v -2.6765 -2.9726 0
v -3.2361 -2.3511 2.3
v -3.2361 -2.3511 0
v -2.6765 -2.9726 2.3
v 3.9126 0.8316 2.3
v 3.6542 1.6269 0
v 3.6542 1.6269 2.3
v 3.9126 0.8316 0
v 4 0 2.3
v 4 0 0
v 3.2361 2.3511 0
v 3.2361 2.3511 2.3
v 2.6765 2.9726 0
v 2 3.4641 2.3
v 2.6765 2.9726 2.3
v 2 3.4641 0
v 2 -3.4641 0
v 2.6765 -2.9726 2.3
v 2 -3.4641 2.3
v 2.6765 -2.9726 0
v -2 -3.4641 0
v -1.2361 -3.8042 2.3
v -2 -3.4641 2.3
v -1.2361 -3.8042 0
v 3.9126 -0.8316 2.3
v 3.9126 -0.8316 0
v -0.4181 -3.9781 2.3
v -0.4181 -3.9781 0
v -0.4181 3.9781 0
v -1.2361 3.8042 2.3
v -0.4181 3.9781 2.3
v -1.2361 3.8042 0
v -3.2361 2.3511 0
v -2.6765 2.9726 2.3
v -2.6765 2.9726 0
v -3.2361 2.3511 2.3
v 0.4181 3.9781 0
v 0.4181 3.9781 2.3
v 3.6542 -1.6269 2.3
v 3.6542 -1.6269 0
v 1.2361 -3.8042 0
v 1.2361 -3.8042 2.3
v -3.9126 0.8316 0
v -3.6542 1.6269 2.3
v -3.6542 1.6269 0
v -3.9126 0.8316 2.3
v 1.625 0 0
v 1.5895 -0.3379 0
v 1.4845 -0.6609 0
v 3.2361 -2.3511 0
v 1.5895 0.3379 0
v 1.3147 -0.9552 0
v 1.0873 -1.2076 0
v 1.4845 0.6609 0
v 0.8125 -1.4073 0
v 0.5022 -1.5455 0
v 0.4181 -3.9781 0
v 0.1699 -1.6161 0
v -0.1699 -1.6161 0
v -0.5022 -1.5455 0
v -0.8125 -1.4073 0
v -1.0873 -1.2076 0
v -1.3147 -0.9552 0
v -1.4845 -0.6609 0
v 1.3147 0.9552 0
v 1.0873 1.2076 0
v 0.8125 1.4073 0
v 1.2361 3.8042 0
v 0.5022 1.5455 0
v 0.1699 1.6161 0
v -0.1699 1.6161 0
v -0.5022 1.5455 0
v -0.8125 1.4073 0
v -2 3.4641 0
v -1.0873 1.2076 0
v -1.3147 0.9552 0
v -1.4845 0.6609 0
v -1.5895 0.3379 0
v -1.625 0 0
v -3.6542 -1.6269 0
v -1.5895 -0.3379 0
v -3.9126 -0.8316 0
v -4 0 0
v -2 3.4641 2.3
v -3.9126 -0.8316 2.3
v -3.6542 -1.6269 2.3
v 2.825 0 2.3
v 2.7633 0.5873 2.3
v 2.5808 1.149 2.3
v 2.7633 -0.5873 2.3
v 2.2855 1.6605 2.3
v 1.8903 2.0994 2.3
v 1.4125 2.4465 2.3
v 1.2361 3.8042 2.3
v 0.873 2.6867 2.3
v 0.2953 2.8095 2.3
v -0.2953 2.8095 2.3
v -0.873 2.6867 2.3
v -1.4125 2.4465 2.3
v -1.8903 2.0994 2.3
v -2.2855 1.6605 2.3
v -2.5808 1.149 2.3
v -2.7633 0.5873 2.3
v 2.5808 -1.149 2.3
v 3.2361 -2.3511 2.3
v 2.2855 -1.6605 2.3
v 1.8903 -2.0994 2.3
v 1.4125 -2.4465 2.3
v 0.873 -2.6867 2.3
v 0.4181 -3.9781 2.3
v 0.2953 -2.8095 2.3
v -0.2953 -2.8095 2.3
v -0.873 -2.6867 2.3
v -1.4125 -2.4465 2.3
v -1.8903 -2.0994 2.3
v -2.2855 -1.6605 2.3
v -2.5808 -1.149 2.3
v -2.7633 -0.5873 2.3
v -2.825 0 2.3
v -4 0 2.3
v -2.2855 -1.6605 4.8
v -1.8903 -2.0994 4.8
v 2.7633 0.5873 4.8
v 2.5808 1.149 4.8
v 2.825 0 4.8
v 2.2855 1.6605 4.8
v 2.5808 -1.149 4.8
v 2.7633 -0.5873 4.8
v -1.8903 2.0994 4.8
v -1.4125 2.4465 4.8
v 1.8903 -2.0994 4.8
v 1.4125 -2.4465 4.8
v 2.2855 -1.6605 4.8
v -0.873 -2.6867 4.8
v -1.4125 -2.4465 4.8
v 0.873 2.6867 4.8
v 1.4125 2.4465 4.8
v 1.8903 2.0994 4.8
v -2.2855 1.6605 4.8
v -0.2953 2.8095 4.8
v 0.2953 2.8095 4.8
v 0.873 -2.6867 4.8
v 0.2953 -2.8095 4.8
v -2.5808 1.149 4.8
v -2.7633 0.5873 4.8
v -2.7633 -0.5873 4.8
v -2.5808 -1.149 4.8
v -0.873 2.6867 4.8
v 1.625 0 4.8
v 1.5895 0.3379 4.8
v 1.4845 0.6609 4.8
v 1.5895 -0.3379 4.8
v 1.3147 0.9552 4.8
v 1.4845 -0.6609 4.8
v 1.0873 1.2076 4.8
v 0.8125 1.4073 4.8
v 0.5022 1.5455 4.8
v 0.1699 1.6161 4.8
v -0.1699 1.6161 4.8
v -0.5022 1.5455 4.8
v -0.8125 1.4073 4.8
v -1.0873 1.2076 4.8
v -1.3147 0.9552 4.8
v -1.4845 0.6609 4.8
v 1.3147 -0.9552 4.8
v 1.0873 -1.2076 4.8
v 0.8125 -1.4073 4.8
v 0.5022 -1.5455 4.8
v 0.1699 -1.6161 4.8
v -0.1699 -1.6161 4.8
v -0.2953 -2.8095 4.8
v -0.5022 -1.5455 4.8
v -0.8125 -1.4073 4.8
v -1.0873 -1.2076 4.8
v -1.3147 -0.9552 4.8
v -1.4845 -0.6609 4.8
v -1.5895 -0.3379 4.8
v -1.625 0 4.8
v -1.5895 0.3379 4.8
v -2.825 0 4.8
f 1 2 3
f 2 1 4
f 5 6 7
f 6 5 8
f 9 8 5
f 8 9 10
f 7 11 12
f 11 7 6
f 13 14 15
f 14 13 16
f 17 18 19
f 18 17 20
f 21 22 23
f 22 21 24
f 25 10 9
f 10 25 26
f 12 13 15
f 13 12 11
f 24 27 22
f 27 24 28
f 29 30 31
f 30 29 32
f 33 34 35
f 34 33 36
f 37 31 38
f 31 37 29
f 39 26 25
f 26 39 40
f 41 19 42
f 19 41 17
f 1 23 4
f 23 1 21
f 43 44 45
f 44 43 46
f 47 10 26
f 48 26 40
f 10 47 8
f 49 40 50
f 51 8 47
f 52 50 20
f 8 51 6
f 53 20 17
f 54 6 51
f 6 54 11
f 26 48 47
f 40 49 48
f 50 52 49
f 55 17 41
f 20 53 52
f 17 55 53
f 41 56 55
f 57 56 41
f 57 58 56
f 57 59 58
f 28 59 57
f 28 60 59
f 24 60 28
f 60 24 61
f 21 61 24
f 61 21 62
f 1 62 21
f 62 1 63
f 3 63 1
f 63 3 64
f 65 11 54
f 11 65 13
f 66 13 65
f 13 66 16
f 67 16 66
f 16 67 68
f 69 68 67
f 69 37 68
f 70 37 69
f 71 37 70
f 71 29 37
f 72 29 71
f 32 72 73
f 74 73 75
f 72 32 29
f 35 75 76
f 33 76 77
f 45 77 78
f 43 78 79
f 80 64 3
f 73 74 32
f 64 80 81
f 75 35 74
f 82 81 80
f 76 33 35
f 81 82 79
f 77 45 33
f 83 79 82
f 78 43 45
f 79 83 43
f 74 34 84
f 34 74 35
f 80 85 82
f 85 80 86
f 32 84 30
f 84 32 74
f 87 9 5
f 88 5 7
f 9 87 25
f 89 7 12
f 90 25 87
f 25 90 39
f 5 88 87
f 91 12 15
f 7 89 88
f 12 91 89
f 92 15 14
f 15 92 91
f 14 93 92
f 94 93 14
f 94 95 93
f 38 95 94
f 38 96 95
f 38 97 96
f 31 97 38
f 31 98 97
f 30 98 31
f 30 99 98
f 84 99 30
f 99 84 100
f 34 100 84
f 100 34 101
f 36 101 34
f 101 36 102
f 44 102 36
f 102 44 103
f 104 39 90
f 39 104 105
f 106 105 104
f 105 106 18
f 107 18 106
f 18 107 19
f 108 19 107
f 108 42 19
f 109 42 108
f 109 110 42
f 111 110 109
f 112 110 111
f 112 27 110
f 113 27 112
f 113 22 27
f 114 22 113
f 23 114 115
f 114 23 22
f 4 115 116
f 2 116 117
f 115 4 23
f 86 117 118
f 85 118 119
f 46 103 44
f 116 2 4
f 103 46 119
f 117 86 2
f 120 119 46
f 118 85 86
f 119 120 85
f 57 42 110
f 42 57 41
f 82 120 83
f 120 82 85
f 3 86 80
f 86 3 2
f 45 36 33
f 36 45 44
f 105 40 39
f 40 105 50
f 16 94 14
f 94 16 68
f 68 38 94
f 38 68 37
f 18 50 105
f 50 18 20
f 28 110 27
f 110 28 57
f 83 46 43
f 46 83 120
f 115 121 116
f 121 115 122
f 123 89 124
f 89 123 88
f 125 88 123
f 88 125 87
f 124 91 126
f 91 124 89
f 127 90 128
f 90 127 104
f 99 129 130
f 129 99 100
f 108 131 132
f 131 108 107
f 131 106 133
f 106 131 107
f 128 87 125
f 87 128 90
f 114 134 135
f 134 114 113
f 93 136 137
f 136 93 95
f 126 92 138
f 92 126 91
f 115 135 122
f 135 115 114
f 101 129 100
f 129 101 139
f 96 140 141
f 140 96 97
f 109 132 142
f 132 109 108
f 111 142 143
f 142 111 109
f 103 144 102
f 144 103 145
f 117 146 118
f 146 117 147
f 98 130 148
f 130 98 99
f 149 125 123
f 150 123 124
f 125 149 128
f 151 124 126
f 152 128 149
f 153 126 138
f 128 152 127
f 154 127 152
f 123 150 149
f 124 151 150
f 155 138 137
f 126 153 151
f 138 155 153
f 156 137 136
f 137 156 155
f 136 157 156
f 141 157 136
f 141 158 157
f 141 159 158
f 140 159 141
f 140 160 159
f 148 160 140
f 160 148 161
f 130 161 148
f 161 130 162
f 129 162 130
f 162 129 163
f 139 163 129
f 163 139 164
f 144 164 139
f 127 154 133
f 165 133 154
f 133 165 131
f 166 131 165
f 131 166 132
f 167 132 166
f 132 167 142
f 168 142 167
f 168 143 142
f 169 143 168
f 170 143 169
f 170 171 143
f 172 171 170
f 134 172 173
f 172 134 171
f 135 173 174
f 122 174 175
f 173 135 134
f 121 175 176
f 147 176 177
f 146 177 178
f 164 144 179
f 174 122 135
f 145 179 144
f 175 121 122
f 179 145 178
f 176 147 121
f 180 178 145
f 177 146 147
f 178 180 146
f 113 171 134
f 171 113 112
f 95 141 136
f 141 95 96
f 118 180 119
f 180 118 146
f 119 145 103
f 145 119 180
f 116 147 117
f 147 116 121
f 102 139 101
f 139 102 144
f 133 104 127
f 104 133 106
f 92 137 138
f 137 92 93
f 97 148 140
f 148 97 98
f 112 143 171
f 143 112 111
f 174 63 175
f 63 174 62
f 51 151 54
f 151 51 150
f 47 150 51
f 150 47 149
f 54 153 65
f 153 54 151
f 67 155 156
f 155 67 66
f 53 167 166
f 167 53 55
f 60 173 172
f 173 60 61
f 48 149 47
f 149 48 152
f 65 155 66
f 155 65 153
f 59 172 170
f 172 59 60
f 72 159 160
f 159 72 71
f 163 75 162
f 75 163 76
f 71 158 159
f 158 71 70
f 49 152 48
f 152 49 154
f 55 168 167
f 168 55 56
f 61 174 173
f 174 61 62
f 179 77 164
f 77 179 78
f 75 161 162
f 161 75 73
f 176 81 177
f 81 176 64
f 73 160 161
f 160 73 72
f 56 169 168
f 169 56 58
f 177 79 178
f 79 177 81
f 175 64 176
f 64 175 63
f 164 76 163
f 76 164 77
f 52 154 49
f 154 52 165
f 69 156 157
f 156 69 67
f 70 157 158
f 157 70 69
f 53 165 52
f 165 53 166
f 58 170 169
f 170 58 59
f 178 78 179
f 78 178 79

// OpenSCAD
// file: ../settings.scad
// Common settings used by all scad files.

// ALL UNITS IN MILLIMETERS (MM)!!!

$fn = 30;//low-res but fast to render
//$fn = 50;//higher-res but slow to render

pi = 3.1415926535897932384626433832795;

max_footprint = 150; // 15x15 cm

bottom_clearance = 10;
bottom_clearance = 25.4/2+10;
//bottom_clearance = 30;

shell_alpha = 0.215;
//shell_alpha = 1.0;

tolerance = 0.5;

// Flat countersunk M2.5mm x 0.45mm machine screw.
screw_thread_diameter = 2.5;//2.8;//2.75;//2.4?
screw_thread_length = 5;//?
screw_head_diameter = 4.75; // M2.5
//screw_head_diameter = 5.2; // M3
screw_head_height = 1.5;//2;

screw_thread_diameter2 = 2;

unit_thickness = 5;
u = unit_thickness;

shell_thickness = unit_thickness;

// Show flags.
show_platform = 0;
show_head = 1;
show_head_shell = 0;
show_head_electronics_bb = 0;
show_battery = 1;
show_foot_cube = 0;
show_torso = 0;
show_motor = 0;
show_motor_plates = 1;
show_motor_inner_plates = 1;
show_motor_outer_plates = 1;
show_wheel = 0;//obsolete
show_tracks = 1;//
show_track_wheels = 1;
show_caster = 0;
show_rpi = 1;
show_vertical_plates = 1;//
show_horizontal_plates = 1;//
show_caster_plates = 0;//obsolete?
show_camera = 1;
show_screen = 0;
show_edge_mount = 1;
show_sonar_mount = 1;
show_recharge_mount = 1;
show_conduit = 1;
show_torso_shell = 1;
show_recharge_dock = 0;
show_head_tilt_axis = 0;
show_rpi_camera_axis = 0;
show_laser_axis = 0;

head_vertical_angle_tilt = 0;
//head_vertical_angle_tilt = 30;//max
//head_vertical_angle_tilt = 10;

torso_height = 120+20;

base_plate_diameter = max_footprint-unit_thickness*2;
base_plate_frame = 0;

head_height = 50;
head_offset_z = max_footprint/2;
head_middle_cutout = 85;

rpi_with_four_hats_and_clearance = 76;

qrd1114_w = 6.10;
qrd1114_l = 4.39;
qrd1114_h = 4.65;

dock_radius = 10;
dock_gripper_border = 2;
dock_gripper_instep = 0.9;
dock_gripper_cutout_tapper = 50;
dock_receiver_height = 5;

// Patriod Fuel+ 9000 mAh
battery_length = 90;
battery_width = 57;
battery_height = 23;
battery_offset_z = 30;//4;

wheel_diameter = 50;
wheel_offset_x = 65;
wheel_offset_z = wheel_diameter/2;
wheel_axle_diameter = 5;

//caster_diameter = 19.05; // 0.75 inches
caster_diameter = 25.45; // 1 inches
//caster_diameter = 15.875; // 5/8 inches
caster_holder_diameter = 30;//31;
caster_offset_y = base_plate_diameter/2 - caster_holder_diameter/2;

arduino_offset_x = 0;
arduino_offset_y = 0;
arduino_offset_z = 67;
arduino_offset_x2 = 0;
arduino_offset_y2 = -20;
arduino_offset_z2 = torso_height+bottom_clearance;

horizontal_plate_width = unit_thickness*8*2 - unit_thickness*2;
horizontal_plate_depth = unit_thickness*8*2;

vertical_plate_width = horizontal_plate_depth;
vertical_plate_height = unit_thickness*8;
vertical_plate_offset_x = wheel_offset_x-22.5;
vertical_plate_offset_z = vertical_plate_height/2 + unit_thickness/2;

vertical_battery_plate_height = 100 - 15;

caster_plate_width = horizontal_plate_width + unit_thickness*2;
caster_plate_mount_length = unit_thickness*4;
caster_plate_width_minor = caster_holder_diameter;

motor_switch_length = 20;
motor_switch_thickness = 6.5;
motor_switch_height = 11;
motor_switch_height_leads = 23;
motor_switch_on_height =  13.3;
motor_switch_hole_diameter = 2.5;
motor_switch_hole_offset_z = 6.5;//this plus diameter/2 is hole center from switch top
motor_switch_hole_spacing = 7.1;// holes are diameter/2 from this

motor_length = 60;
motor_width = 25;
motor_collar_width = 7;
motor_collar_height = 2.5;
motor_axle_width = 4;
motor_axle_height = 9.5;
motor_offset_x = 10;
//motor_offset_y = motor_width/2+5;
motor_offset_y = unit_thickness*3.5;
motor_offset_z = vertical_plate_height/2 - unit_thickness/2;//4;//30;
motor_mount_holes_dist = 17;
// motor countersink hole
motor_mount_holes_width = 3; // M3
motor_mount_holes_head_height = 2.2;
motor_mount_holes_head_width = 5.8;
motor_bearing_outer_diameter = 10;
motor_bearing_inner_diameter = 5.95;
motor_bearing_thickness = 2.5;

motor_unimount_idler_axle_d = screw_thread_diameter;
//motor_unimount_spacer_depth = 0.1;//too small
motor_unimount_spacer_depth = 0.5;

motor_arm_offset_y = -u*3;
motor_arm_offset_z = u*.5;

motor_plate_width = vertical_plate_width;
motor_plate_height = vertical_plate_height;
motor_plate_thickness = unit_thickness;
motor_plate_offset_z = vertical_plate_offset_z;

motor_plate_middle_thickness = 5;

wheel_hub_offset = u*3;

motor_hole_height_offset = -5;

nylon_spacer_outer_diameter = 6.35;
nylon_spacer_inner_diameter = 3.302;
nylon_spacer_length = 12.7;

track_width = unit_thickness*3;
track_offset_x = -50;
track_offset_z = .1;
//track_wheel_radius = 19;//original
track_wheel_radius = 14;
//track_wheel_hole_radius = (nylon_spacer_outer_diameter+1)/2;
track_wheel_hole_radius = motor_bearing_outer_diameter/2;

track_driver_hole_radius = (motor_axle_width)/2 + 0.1;
track_driver_set_screw_head_d = 4.1;
track_driver_set_screw_shaft_d = 2.4;
//track_wheel_width = 13.5;//original
track_wheel_width = u*2;
track_wheel_width_buffer = u*0.25;
track_offset = 3;        //distance from chassis
track_wheel_offset = track_offset;
//track_length = 250; // see tread_triangle.py, too big
//track_length = 240; // see tread_triangle.py
//track_length = 238; //inc/dec in 10 unit increments so notches match idlers
track_length = 228; //inc/dec in 10 unit increments so notches match idlers
track_radius = track_length/2/pi;
track_wheel_show_fancy = 1;
track_wheel_gap = track_wheel_width + track_wheel_width_buffer*2;
track_axle_bearing_diameter = motor_bearing_inner_diameter - 0.1;
track_tensioner_radius = 12;
track_nut_height = 3.5; //TODO
track_punchout_thickness = 0.25;//should be the same as the minimum layer thickness

head_slew_bearing_outer_diameter = 115;
head_slew_bearing_ring_thickness = 20;
head_slew_bearing_inner_diameter = head_slew_bearing_outer_diameter - head_slew_bearing_ring_thickness;
//head_slew_bearing_hole_diameter = head_slew_bearing_inner_diameter - head_slew_bearing_ring_thickness;
head_slew_bearing_hole_diameter = 12+tolerance; // slip ring https://www.adafruit.com/products/775
//head_slew_bearing_ball_diameter = 5;
head_slew_bearing_ball_diameter = 2.5; //u/2;
head_slew_bearing_height = u;//head_slew_bearing_ball_diameter*2;
head_slew_bearing_gap = 0.5;
head_slew_bearing_slew_gap = 0;
head_slew_bearing_gap_factor = 0.1;

neck_strut_width = u*7;
neck_strut_height = u*18;
neck_strut_spacing = u*8;

show_outer_race = 0;
show_inner_race_a = 1;
show_inner_race_b = 1;
show_balls = 0;
// main file
include <../settings.scad>;

module make_axle_a(){

    h = track_wheel_width/2 - 0.2;

    difference(){
        union(){
            // main body
            // this should be slightly smaller than the hole on the idler wheel
            cylinder(
                d=track_wheel_hole_radius*2-2,
                h=h-motor_bearing_thickness);
            
            // nub sticking out to center the bearing
            // this should be slightly smaller than the hole on the bearing
            cylinder(d=track_axle_bearing_diameter-0.2, h=h);
        }
        // axle hole
        cylinder(
            d=screw_thread_diameter+tolerance*1.5,
            h=track_wheel_gap*2, center=true);
    }
}

module make_axle_b(){

    h = track_wheel_width_buffer;

    difference(){
        union(){
            // main body
            // this should be slightly larger than the hole on the idler wheel
            cylinder(
                d=track_wheel_hole_radius*2+2,
                h=h/2);
            
            // nub sticking out to center the bearing
            // this should be slightly smaller than the hole on the idler wheel
            cylinder(
                d=track_wheel_hole_radius*2-2,
                h=h);
        }
        // axle hole
        cylinder(
            d=screw_thread_diameter+tolerance*1.5,
            h=track_wheel_gap*2, center=true);
    }
}


make_axle_a();

//translate([0,15,0]) make_axle_b();
